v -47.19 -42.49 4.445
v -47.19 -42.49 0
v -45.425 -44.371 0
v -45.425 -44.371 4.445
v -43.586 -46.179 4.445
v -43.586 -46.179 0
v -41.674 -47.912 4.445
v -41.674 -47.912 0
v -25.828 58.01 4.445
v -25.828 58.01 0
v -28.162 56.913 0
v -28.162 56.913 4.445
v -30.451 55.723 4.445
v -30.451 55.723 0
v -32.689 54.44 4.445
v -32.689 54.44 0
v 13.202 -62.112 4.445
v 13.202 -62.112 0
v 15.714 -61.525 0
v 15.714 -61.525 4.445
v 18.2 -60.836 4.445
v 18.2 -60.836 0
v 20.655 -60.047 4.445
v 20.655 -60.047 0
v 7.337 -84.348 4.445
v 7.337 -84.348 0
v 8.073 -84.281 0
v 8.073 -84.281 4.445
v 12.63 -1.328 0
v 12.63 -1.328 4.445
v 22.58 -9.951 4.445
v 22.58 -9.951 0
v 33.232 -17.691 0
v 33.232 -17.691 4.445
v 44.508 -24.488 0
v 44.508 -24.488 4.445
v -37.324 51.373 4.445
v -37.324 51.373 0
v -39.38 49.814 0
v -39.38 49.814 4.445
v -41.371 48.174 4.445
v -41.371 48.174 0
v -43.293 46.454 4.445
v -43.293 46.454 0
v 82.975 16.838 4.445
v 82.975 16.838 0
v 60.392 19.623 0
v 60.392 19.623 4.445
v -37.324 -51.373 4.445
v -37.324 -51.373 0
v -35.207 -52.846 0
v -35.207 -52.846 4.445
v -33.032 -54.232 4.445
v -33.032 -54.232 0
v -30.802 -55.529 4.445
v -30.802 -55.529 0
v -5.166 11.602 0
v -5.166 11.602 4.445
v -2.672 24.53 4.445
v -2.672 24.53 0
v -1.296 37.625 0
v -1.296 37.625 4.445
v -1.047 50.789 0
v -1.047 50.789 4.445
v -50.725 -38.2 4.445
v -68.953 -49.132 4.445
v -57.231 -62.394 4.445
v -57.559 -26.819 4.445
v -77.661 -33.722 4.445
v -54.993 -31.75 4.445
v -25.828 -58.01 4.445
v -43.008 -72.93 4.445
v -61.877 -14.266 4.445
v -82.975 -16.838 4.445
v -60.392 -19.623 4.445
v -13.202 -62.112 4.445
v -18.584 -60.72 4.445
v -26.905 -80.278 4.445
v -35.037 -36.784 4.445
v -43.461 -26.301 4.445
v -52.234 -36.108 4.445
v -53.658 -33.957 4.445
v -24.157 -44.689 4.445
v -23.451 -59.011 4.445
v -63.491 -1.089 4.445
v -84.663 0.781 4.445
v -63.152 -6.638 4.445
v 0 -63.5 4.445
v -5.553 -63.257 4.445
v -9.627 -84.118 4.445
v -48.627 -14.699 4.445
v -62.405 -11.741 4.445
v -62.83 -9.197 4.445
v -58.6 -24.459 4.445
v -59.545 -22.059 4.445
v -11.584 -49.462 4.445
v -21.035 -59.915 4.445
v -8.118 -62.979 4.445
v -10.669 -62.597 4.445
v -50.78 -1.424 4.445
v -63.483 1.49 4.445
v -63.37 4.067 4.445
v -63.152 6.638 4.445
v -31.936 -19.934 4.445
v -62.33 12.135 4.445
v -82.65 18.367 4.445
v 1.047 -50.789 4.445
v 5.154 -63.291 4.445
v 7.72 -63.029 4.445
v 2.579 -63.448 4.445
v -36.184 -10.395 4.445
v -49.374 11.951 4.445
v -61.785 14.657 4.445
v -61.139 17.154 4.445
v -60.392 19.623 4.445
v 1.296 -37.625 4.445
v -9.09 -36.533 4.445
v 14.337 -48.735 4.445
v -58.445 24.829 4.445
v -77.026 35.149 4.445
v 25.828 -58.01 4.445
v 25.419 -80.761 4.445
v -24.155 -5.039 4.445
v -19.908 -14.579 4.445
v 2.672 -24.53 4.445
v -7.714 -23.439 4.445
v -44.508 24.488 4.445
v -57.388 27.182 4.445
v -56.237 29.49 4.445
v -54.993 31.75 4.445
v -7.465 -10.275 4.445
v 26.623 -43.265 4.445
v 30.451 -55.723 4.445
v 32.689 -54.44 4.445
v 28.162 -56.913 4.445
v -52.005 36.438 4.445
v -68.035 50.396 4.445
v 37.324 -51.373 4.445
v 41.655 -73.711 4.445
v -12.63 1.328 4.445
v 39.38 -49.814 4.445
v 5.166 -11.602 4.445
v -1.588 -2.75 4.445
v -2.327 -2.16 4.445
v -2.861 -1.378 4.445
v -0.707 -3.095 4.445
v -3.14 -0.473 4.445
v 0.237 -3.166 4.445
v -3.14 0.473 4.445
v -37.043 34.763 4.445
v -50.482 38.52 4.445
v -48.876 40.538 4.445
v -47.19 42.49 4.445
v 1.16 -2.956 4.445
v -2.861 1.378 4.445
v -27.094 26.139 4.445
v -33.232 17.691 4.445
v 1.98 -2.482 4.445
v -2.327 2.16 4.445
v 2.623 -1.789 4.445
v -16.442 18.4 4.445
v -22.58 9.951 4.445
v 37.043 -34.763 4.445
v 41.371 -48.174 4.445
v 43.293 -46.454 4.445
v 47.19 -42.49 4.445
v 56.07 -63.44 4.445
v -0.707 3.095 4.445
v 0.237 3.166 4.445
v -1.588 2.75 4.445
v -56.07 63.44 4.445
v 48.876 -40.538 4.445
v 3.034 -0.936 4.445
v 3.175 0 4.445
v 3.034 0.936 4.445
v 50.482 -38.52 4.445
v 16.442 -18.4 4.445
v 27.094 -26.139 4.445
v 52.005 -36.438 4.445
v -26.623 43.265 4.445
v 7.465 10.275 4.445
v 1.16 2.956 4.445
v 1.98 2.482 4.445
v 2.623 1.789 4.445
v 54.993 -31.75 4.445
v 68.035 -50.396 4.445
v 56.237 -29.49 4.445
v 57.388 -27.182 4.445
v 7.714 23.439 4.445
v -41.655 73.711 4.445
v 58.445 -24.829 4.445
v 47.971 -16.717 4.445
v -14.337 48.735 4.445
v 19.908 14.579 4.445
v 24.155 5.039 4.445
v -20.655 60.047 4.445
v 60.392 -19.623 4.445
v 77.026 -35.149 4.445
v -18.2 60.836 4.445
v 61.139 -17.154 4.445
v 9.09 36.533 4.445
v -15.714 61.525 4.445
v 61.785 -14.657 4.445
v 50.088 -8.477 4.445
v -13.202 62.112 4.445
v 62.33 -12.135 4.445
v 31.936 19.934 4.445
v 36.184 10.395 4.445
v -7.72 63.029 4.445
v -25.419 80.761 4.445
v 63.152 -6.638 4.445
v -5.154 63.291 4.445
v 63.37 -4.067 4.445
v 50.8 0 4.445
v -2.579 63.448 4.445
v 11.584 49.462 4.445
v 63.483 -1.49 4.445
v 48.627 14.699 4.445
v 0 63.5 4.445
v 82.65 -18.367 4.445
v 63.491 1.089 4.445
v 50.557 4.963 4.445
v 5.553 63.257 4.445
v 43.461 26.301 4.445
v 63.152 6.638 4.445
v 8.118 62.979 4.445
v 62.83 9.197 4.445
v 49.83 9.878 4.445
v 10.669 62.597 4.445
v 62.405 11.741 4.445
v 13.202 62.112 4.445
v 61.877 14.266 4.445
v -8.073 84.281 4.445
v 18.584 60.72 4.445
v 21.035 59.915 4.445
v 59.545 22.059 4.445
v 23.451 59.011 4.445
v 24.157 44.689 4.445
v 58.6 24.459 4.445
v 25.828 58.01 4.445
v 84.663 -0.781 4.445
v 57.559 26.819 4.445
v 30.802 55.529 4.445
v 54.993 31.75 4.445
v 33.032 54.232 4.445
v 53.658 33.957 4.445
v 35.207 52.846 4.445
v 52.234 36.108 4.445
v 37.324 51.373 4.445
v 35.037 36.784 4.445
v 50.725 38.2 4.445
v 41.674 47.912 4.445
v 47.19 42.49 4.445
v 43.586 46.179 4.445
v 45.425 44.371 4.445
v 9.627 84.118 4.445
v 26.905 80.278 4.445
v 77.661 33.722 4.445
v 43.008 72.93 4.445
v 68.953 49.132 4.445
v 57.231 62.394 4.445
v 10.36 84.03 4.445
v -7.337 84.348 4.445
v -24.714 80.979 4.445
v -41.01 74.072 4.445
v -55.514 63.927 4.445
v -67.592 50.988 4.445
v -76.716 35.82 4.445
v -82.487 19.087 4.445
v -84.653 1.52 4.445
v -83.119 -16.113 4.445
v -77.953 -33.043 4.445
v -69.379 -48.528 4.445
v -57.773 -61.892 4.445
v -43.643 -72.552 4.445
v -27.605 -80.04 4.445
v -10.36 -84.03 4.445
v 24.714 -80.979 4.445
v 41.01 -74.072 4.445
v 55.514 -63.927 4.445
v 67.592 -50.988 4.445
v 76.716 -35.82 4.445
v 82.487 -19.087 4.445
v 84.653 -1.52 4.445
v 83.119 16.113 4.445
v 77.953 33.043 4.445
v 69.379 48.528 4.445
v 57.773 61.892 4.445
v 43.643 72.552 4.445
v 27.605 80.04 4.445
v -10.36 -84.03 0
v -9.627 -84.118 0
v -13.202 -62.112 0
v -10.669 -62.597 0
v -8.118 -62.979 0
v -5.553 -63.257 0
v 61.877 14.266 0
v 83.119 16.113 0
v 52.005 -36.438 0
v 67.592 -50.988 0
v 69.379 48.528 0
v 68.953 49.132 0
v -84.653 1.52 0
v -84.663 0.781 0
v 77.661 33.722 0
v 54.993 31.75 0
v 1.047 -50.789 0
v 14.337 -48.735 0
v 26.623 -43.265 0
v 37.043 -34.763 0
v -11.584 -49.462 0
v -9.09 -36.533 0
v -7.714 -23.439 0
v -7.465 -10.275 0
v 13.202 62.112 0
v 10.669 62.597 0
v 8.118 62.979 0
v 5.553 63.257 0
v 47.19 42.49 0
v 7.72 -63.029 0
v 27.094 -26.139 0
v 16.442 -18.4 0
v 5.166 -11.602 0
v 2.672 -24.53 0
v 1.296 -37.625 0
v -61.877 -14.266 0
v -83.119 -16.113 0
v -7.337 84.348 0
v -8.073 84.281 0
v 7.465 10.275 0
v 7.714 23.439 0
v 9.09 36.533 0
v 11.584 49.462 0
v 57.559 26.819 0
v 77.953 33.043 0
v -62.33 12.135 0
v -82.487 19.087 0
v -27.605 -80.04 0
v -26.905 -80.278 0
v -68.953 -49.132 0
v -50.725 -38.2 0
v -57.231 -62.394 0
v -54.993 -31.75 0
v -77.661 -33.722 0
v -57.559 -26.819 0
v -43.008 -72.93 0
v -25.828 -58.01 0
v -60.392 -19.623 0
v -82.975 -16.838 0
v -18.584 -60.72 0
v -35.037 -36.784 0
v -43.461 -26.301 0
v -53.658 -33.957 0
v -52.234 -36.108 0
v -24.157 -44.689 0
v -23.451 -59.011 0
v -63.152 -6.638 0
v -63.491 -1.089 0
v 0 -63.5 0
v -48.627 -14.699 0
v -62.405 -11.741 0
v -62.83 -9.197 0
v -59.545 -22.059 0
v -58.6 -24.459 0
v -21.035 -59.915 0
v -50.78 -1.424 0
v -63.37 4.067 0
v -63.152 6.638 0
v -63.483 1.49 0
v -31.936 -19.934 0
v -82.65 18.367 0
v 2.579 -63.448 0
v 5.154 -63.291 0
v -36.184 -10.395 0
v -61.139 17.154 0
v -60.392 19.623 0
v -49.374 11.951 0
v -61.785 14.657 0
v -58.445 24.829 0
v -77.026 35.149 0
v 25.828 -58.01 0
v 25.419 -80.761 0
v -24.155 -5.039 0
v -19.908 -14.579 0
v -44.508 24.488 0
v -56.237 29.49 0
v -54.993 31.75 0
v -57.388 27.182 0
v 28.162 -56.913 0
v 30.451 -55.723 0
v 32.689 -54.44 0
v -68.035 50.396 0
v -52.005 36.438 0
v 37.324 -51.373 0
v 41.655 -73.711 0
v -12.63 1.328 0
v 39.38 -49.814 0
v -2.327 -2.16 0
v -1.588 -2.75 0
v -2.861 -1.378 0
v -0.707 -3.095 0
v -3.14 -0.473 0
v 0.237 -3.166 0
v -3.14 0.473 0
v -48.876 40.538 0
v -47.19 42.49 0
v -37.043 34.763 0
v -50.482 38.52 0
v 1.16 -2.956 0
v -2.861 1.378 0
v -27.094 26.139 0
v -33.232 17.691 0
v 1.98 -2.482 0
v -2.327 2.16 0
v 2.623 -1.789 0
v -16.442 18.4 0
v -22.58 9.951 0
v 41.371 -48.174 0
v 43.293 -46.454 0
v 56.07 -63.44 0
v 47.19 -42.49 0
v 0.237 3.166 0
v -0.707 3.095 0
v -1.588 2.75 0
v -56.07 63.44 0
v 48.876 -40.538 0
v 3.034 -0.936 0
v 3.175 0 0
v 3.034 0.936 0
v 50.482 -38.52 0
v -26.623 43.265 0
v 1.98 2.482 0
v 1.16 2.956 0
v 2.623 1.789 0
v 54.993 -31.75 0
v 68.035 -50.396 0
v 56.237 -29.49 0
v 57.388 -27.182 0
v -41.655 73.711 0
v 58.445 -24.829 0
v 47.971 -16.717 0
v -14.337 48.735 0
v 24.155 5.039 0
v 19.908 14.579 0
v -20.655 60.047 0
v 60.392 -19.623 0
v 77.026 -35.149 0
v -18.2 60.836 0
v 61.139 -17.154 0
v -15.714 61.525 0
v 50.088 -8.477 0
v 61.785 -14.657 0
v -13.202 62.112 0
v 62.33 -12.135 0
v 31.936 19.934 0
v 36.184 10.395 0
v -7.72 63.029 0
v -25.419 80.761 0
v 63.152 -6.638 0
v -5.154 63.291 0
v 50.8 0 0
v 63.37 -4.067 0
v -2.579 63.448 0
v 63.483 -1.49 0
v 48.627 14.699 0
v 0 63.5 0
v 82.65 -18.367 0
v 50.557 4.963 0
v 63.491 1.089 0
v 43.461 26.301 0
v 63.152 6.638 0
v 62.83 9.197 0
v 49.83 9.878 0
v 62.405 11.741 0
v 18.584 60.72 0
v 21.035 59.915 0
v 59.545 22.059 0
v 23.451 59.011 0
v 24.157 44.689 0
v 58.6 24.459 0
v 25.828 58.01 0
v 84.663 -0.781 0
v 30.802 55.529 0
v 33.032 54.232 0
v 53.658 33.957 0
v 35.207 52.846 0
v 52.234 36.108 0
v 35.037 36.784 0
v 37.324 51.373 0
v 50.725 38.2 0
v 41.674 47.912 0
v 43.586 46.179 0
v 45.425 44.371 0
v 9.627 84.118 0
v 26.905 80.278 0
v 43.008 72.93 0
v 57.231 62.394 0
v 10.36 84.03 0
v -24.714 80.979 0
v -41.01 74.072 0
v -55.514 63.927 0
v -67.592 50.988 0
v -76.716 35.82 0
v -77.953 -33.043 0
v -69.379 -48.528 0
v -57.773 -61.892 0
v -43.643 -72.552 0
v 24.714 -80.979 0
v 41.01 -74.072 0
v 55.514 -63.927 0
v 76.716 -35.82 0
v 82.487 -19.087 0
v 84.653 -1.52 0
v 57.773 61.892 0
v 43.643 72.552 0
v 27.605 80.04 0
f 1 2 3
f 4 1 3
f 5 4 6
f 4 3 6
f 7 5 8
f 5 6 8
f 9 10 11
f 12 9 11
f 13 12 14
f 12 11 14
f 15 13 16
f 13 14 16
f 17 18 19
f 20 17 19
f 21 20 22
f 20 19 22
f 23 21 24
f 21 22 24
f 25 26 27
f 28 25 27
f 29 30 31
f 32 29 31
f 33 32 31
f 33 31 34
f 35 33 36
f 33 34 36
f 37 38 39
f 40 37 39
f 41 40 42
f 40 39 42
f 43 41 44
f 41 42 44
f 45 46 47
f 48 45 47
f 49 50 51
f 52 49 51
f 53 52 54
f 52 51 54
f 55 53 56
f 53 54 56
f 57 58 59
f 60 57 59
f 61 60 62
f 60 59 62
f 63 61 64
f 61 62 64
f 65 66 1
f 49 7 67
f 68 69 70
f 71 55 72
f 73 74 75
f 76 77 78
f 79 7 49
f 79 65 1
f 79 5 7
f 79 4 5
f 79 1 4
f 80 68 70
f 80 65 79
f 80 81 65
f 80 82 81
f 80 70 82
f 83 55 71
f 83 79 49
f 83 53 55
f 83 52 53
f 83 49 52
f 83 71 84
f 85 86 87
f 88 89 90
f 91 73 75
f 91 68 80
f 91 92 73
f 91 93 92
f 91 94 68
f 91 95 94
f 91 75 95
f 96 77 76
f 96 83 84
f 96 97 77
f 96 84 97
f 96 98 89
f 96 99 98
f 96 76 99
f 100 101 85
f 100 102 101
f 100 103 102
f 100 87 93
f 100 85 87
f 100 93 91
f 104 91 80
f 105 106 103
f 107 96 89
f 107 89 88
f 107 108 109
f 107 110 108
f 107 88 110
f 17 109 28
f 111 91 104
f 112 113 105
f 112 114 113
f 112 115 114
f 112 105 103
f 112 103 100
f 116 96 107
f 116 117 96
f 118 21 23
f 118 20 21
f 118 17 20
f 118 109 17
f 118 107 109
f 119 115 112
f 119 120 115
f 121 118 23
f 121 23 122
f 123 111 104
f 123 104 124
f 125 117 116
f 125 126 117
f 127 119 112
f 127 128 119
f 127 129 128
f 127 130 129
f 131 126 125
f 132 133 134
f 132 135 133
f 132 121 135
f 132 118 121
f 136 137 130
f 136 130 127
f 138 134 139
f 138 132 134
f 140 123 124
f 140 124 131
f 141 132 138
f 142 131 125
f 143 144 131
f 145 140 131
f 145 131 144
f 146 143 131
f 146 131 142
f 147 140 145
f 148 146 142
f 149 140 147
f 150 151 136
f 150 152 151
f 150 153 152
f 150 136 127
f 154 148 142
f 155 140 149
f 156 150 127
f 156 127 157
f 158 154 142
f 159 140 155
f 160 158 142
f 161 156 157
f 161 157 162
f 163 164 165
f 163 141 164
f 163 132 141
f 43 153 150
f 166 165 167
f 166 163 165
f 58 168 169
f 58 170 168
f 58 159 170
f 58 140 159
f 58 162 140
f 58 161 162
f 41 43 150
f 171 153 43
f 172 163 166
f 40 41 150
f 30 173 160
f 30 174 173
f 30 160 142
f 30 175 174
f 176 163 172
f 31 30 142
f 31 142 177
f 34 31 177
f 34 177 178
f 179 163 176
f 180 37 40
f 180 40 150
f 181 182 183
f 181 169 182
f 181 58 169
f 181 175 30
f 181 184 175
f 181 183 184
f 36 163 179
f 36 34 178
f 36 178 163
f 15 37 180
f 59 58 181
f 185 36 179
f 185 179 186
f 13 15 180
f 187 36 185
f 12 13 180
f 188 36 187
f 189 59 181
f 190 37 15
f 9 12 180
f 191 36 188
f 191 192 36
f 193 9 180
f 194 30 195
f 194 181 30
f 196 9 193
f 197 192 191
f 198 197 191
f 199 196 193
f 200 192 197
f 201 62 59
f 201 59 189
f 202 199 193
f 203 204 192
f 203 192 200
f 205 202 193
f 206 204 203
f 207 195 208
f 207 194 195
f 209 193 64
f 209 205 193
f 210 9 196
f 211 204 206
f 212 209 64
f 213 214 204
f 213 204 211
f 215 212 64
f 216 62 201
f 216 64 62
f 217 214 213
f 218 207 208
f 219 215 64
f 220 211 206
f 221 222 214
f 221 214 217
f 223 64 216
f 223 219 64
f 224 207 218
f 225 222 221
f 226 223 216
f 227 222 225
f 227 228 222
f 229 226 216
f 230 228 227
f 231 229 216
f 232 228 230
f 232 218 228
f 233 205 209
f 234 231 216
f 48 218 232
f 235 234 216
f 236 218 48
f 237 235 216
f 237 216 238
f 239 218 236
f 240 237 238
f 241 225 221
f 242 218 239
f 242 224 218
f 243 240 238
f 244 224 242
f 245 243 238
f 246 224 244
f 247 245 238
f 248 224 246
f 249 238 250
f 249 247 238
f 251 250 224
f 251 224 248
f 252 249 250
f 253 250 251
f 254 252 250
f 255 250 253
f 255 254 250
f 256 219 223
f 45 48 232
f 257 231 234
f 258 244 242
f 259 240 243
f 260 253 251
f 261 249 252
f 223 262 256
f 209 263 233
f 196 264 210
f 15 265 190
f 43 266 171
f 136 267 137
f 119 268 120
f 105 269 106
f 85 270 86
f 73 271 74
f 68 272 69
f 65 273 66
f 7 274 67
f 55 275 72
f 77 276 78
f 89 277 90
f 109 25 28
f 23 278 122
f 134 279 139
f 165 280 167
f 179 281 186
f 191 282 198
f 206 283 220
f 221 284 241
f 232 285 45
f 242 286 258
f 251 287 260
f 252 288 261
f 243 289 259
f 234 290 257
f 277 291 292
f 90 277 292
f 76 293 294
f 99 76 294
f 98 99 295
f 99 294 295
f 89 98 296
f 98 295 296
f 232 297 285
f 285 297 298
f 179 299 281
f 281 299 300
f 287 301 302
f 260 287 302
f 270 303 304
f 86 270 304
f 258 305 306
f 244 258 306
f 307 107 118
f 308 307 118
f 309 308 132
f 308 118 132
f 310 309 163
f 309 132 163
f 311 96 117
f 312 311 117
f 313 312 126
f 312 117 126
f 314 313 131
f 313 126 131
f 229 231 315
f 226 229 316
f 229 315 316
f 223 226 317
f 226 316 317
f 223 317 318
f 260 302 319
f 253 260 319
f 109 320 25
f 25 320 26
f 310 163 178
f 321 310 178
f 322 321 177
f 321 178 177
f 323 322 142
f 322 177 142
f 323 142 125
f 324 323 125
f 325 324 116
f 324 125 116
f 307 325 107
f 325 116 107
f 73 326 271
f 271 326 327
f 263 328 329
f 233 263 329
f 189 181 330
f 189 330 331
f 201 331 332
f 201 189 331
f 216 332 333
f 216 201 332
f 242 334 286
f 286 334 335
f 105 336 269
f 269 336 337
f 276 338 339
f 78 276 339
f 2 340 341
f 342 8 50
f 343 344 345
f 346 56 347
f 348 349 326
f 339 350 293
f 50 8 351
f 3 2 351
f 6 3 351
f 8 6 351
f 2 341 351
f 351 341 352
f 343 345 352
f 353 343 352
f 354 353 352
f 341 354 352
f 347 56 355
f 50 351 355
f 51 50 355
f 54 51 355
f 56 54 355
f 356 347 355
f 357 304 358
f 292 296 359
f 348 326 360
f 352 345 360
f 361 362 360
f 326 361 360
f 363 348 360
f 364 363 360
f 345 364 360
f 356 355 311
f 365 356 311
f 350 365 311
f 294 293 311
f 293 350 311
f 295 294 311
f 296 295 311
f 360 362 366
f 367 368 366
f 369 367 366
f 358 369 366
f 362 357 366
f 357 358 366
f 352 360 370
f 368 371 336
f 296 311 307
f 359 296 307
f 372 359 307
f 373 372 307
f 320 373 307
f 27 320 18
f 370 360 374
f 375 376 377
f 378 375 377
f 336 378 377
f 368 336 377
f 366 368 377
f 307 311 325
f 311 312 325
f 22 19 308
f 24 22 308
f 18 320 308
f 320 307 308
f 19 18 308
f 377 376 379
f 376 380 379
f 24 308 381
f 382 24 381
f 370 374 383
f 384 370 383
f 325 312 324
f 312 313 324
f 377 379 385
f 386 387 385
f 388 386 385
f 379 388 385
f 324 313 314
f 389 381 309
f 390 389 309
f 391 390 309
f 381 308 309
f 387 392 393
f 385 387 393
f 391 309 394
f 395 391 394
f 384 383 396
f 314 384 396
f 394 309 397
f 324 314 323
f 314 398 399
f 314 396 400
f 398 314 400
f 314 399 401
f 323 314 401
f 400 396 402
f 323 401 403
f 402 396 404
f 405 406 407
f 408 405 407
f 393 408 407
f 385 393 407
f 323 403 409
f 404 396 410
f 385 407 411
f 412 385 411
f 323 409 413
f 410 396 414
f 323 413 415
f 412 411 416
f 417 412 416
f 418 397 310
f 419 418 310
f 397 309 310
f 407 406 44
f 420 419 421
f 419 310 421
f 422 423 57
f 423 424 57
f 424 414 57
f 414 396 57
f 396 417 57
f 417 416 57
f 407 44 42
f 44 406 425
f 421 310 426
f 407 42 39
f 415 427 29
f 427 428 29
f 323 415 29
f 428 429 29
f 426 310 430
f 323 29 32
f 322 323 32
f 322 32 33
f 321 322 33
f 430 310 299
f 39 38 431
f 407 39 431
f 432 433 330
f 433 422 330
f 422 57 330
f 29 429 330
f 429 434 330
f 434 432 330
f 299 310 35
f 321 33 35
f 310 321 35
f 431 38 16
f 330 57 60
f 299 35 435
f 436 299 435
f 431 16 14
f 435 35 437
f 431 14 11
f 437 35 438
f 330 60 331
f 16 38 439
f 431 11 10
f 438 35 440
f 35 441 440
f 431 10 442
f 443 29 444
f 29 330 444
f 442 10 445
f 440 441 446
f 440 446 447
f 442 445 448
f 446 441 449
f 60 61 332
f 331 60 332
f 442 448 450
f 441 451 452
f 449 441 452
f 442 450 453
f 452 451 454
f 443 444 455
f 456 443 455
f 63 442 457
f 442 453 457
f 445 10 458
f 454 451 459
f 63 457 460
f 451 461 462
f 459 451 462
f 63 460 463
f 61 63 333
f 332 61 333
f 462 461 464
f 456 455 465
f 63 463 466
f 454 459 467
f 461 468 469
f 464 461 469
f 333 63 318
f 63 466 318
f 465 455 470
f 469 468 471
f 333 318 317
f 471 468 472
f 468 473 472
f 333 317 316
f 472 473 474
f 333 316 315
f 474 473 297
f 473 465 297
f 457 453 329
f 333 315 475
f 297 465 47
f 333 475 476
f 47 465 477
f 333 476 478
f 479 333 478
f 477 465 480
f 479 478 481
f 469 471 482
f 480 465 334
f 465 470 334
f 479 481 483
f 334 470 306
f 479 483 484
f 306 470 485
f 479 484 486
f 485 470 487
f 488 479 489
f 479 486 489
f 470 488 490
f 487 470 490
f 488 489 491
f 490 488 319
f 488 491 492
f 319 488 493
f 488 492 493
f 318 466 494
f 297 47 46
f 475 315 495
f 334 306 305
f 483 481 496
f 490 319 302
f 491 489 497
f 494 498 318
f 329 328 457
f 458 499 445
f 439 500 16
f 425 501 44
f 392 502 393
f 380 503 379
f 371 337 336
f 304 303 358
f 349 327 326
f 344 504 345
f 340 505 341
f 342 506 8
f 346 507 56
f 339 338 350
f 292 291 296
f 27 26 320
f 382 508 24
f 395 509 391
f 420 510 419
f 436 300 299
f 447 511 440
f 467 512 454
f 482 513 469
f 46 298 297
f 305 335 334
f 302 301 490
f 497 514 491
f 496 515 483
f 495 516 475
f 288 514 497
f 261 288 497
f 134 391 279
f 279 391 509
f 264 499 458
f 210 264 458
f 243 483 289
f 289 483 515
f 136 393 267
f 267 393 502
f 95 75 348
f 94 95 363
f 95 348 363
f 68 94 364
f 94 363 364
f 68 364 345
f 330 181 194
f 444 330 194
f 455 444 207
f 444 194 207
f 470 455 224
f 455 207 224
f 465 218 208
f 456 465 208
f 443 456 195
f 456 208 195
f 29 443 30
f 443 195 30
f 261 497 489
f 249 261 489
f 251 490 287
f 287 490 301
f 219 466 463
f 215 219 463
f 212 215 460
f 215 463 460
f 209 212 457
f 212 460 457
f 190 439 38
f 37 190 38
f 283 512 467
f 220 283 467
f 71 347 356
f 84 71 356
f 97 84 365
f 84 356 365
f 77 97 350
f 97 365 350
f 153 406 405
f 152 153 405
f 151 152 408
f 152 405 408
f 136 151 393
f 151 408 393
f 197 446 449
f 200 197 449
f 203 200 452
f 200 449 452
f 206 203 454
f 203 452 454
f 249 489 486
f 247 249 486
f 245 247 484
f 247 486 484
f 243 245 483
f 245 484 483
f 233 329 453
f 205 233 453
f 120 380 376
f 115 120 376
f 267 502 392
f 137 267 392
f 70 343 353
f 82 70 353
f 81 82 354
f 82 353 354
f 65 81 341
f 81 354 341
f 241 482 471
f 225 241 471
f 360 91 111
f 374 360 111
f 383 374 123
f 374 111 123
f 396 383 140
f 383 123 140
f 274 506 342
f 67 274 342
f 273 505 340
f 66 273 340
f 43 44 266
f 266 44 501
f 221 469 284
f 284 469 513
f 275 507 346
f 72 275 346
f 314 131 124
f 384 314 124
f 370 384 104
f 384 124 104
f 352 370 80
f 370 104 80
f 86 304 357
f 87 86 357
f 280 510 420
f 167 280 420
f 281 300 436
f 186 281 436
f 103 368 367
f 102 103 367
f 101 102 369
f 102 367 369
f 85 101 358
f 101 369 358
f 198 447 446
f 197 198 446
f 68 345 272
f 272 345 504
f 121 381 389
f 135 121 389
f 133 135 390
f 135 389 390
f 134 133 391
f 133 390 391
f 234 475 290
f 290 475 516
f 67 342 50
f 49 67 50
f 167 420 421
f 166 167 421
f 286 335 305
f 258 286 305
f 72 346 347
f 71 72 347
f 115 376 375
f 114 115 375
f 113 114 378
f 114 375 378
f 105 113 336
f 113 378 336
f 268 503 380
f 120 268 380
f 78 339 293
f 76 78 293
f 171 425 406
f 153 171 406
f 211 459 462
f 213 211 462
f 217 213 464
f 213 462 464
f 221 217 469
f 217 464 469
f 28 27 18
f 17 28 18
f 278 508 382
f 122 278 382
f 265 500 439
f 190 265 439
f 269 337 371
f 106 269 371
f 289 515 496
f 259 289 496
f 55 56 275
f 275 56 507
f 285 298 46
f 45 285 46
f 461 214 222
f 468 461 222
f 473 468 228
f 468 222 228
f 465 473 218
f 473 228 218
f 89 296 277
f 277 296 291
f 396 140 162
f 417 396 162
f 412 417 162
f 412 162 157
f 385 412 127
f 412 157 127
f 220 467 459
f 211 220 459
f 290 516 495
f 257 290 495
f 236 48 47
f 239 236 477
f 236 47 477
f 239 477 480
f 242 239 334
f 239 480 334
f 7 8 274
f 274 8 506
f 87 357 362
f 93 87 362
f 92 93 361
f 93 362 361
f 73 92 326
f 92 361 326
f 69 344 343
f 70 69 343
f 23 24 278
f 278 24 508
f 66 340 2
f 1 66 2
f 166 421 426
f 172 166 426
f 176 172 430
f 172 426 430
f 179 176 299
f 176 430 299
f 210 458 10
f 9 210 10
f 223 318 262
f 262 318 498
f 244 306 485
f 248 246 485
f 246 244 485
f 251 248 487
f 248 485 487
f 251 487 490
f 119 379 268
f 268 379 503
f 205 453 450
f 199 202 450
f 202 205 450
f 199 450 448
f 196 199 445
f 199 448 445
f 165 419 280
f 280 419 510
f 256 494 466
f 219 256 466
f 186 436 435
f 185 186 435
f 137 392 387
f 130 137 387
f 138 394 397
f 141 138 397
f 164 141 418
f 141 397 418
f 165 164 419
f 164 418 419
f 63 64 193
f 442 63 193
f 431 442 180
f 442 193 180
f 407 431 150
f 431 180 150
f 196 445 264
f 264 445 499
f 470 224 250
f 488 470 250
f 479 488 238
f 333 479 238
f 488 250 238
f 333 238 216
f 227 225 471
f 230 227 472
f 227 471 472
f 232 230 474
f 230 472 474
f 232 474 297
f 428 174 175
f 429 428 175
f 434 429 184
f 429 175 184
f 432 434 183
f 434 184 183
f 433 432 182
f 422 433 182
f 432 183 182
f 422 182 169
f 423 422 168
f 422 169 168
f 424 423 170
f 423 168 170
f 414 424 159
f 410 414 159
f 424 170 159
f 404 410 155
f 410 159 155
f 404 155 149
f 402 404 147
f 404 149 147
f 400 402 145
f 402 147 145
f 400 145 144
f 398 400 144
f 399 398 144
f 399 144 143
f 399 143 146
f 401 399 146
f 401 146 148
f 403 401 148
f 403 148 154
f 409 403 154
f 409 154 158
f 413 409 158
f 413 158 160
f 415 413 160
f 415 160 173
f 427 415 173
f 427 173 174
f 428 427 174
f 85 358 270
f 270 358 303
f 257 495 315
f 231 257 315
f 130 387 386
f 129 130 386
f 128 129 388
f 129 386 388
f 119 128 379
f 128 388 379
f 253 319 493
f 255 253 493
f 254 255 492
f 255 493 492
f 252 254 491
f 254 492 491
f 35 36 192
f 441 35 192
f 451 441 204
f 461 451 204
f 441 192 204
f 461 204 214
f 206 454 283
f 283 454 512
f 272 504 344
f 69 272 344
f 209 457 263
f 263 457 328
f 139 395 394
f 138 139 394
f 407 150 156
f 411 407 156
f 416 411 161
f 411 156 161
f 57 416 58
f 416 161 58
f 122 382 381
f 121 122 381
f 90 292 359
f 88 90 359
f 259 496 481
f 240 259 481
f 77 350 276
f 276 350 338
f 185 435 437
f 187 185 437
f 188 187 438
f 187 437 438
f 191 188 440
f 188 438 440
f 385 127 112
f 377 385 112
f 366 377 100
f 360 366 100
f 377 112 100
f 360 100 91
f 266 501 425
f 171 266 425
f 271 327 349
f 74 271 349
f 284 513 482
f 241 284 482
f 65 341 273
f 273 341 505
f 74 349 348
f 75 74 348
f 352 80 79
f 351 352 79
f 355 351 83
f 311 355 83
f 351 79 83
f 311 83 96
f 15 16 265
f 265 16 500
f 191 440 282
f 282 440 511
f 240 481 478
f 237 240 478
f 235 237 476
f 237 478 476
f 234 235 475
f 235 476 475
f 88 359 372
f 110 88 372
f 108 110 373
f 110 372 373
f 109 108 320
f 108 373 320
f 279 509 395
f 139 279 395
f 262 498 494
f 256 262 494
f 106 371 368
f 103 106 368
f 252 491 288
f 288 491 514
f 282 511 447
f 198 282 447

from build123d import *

# Parameters (mm, degrees)
SKETCH1_R           = 63.5
BOSS_EXTRUDE1_DEPTH = 4.445
BOSS_EXTRUDE2_START = -4.445
BOSS_EXTRUDE2_DEPTH = 4.445
CIRPATTERN1_COUNT   = 30
SKETCH3_R           = 3.175
CUT_EXTRUDE1_DEPTH  = 120.591712413
CUT_EXTRUDE2_DEPTH  = 120.591712413


with BuildPart() as part:
    # Sketch1 → Boss-Extrude1 (new body)
    with BuildSketch(Plane.XY):
        Circle(SKETCH1_R)
    extrude(amount=BOSS_EXTRUDE1_DEPTH)

    # Sketch2 → Boss-Extrude2 (add)
    with BuildSketch(Plane.XY.offset(4.445).offset(BOSS_EXTRUDE2_START)):
        with BuildLine():
            Line((9.626690277, 84.117518638), (0, 63.5))
            ThreePointArc((0, 63.5), (2.779385353, 63.439144202), (5.553443409, 63.256693451))
            Line((5.553443409, 63.256693451), (10.360378235, 84.030308047))
            Line((10.360378235, 84.030308047), (9.626690277, 84.117518638))
        make_face()
    boss_extrude2 = extrude(amount=BOSS_EXTRUDE2_DEPTH)

    # CirPattern1: Boss-Extrude2 ×30 about axis
    cirpattern1_axis = Axis((0, 0, 0), (0, 0, 1))
    for i in range(1, CIRPATTERN1_COUNT):
        add(boss_extrude2.rotate(cirpattern1_axis, i * 360 / CIRPATTERN1_COUNT))

    # Sketch3 → Cut-Extrude1 (cut, through all)
    with BuildSketch(Plane.XY.offset(4.445)):
        Circle(SKETCH3_R)
    extrude(amount=-CUT_EXTRUDE1_DEPTH, mode=Mode.SUBTRACT)

    # Sketch4 → Cut-Extrude2 (cut, through all)
    with BuildSketch(Plane.XY.offset(4.445)):
        with BuildLine():
            Line((-5.165555367, 11.602027312), (-1.046816164, 50.789213185))
            ThreePointArc((-1.046816164, 50.789213185), (-20.662221468, 46.408109248), (-37.043284234, 34.76255303))
            ThreePointArc((-37.043284234, 34.76255303), (-21.850907071, 22.154838588), (-5.165555367, 11.602027312))
        make_face()
        with BuildLine():
            ThreePointArc((-48.626896141, -14.699148671), (-30.11210657, -7.846021325), (-12.630428071, 1.327511483))
            ThreePointArc((-12.630428071, 1.327511483), (-27.822805234, 13.935225925), (-44.508156938, 24.488037201))
            ThreePointArc((-44.508156938, 24.488037201), (-50.521712285, 5.310045934), (-48.626896141, -14.699148671))
        make_face()
        with BuildLine():
            ThreePointArc((-11.583611907, -49.461701701), (-8.261199499, -30.000859913), (-7.464872704, -10.274515829))
            ThreePointArc((-7.464872704, -10.274515829), (-25.979662276, -17.127643175), (-43.461340774, -26.301175983))
            ThreePointArc((-43.461340774, -26.301175983), (-29.859490816, -41.098063314), (-11.583611907, -49.461701701))
        make_face()
        with BuildLine():
            ThreePointArc((37.043284234, -34.76255303), (21.850907071, -22.154838588), (5.165555367, -11.602027312))
            ThreePointArc((5.165555367, -11.602027312), (1.843142958, -31.0628691), (1.046816164, -50.789213185))
            ThreePointArc((1.046816164, -50.789213185), (20.662221468, -46.408109248), (37.043284234, -34.76255303))
        make_face()
        with BuildLine():
            ThreePointArc((48.626896141, 14.699148671), (30.11210657, 7.846021325), (12.630428071, -1.327511483))
            ThreePointArc((12.630428071, -1.327511483), (27.822805234, -13.935225925), (44.508156938, -24.488037201))
            ThreePointArc((44.508156938, -24.488037201), (49.201902262, -12.64170929), (50.8, 0))
            ThreePointArc((50.8, 0), (50.253787539, 7.429457451), (48.626896141, 14.699148671))
        make_face()
        with BuildLine():
            ThreePointArc((43.461340774, 26.301175983), (29.859490816, 41.098063314), (11.583611907, 49.461701701))
            Line((11.583611907, 49.461701701), (7.464872704, 10.274515829))
            ThreePointArc((7.464872704, 10.274515829), (25.979662276, 17.127643175), (43.461340774, 26.301175983))
        make_face()
        with BuildLine():
            Line((-1.046816164, 50.789213185), (-5.165555367, 11.602027312))
            ThreePointArc((-5.165555367, 11.602027312), (-1.843142958, 31.0628691), (-1.046816164, 50.789213185))
        make_face()
        with BuildLine():
            ThreePointArc((7.464872704, 10.274515829), (8.261199499, 30.000859913), (11.583611907, 49.461701701))
            Line((11.583611907, 49.461701701), (7.464872704, 10.274515829))
        make_face()
    extrude(amount=-CUT_EXTRUDE2_DEPTH, mode=Mode.SUBTRACT)


solid = part.part
